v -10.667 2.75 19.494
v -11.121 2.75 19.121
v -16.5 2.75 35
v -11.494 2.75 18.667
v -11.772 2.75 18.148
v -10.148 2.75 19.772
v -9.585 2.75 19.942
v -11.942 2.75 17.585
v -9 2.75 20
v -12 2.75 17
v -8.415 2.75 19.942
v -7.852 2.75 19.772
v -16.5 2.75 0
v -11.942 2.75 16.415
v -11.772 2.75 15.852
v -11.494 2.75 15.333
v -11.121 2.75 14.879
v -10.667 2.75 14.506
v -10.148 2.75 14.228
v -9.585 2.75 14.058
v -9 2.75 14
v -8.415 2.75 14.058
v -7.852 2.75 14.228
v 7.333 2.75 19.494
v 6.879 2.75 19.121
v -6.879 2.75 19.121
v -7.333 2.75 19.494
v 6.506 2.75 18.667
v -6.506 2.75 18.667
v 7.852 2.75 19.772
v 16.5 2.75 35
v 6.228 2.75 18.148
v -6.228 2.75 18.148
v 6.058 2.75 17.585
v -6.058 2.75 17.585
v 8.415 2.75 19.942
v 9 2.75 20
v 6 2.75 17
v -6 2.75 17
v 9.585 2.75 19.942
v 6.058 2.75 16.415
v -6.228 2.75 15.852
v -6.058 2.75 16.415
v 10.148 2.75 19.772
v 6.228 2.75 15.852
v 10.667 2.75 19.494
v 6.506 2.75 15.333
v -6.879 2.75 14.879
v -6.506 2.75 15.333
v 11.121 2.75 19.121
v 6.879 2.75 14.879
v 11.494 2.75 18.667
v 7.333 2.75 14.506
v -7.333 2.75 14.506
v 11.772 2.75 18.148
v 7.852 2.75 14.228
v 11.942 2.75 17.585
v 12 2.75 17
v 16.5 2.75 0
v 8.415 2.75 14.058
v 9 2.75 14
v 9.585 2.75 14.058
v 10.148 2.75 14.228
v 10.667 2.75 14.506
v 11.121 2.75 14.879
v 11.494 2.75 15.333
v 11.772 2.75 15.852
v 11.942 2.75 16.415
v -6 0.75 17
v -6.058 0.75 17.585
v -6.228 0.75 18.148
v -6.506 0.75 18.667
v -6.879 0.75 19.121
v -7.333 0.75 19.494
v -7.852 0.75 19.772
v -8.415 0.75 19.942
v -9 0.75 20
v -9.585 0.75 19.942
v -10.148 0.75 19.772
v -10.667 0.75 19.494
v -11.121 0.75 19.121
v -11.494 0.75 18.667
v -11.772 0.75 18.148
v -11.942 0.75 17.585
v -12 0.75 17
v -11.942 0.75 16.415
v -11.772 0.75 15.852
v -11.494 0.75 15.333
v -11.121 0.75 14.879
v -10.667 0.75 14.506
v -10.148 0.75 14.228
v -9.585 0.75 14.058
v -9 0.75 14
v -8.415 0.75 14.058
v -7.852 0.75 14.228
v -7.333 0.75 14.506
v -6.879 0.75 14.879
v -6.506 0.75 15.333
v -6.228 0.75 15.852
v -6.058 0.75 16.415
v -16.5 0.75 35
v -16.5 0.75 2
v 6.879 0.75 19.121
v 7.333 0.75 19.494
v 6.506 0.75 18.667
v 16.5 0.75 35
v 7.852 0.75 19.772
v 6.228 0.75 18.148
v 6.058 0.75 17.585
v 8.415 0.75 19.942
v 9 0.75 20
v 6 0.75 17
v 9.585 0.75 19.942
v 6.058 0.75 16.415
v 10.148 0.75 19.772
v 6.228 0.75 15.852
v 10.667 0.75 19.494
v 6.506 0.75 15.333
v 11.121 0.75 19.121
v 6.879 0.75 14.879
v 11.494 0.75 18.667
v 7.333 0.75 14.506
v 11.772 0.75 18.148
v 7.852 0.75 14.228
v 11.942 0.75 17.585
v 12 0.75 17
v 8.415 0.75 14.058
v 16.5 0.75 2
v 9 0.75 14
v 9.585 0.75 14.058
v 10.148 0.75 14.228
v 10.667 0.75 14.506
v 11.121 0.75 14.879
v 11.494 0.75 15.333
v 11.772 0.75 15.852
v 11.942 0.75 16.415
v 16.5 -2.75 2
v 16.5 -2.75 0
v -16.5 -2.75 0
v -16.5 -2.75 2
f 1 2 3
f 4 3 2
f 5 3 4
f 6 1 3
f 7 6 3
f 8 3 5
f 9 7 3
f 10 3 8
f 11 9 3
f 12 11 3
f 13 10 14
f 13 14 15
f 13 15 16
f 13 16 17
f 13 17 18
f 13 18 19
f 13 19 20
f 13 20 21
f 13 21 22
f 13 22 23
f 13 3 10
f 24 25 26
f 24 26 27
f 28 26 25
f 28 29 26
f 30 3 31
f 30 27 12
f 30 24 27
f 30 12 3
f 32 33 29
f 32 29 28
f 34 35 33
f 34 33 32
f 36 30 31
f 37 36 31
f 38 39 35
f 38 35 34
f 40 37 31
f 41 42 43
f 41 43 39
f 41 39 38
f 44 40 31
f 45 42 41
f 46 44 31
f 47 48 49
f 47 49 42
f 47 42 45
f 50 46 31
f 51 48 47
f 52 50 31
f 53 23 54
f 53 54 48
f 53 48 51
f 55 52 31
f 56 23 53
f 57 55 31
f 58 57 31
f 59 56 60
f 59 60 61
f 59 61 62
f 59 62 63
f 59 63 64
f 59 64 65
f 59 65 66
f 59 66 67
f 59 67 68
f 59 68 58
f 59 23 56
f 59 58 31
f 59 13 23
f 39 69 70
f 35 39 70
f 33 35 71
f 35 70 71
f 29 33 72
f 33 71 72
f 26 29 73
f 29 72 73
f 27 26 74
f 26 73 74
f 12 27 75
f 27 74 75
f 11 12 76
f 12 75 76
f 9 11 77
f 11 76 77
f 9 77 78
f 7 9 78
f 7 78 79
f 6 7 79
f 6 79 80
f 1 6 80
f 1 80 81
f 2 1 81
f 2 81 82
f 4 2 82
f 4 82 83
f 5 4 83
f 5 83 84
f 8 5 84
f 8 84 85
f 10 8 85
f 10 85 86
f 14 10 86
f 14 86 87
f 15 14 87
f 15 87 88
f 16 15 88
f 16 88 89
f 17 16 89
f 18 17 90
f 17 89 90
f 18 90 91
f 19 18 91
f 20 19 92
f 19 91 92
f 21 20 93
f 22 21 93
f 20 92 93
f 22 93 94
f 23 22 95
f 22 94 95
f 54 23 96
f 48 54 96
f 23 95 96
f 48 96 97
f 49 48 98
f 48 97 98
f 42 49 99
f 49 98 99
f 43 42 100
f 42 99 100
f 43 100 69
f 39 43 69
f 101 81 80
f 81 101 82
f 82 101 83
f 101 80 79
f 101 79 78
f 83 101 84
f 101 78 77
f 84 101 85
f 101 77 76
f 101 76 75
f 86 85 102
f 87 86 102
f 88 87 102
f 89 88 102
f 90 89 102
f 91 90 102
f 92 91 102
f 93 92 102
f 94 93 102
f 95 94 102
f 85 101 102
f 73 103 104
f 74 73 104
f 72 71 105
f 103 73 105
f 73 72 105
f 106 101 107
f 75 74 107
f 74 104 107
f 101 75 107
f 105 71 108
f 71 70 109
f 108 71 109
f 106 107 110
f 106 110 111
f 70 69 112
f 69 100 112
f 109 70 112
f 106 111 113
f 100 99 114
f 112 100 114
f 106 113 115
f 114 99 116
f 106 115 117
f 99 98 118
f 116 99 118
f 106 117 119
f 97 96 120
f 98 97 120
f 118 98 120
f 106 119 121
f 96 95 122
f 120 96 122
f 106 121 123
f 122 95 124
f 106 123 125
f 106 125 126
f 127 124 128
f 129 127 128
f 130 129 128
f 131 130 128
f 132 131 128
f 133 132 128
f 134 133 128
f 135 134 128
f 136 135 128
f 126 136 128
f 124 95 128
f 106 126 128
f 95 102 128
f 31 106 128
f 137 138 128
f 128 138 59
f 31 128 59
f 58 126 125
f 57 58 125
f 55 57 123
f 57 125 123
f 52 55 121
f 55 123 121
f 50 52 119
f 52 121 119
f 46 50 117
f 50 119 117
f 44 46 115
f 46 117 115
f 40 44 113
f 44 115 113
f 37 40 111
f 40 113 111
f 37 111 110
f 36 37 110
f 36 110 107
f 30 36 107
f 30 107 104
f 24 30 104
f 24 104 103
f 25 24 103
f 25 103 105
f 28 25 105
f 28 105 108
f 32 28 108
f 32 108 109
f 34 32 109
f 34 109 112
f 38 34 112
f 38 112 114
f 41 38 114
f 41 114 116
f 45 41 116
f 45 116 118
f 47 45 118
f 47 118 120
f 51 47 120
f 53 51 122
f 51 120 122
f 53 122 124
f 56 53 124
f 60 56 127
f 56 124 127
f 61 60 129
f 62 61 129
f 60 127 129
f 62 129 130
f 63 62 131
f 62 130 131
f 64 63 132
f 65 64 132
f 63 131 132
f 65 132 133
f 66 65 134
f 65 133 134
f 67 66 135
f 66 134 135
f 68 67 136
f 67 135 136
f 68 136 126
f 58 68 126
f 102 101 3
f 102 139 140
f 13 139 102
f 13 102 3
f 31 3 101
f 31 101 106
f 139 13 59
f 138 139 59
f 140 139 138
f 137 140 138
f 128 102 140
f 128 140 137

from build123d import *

# Parameters (mm, degrees)
F0_W     = 33
F0_H     = 5.5
F1_DEPTH = 2
F2_W     = 33
F2_H     = 2
F3_DEPTH = 33
F4_R     = 3
F5_DEPTH = 2.001


with BuildPart() as f1:
    # F0 (on Top) → F1 (new body)
    with BuildSketch(Plane.XY):
        Rectangle(F0_W, F0_H)
    extrude(amount=F1_DEPTH)

    # F2 (on face) → F3 (join)
    with BuildSketch(Plane.XY.offset(2)):
        with Locations((0, 1.75)):
            Rectangle(F2_W, F2_H)
    extrude(amount=F3_DEPTH)

    # F4 (on face) → F5 (cut, through all)
    with BuildSketch(Plane.XZ.offset(-0.75)):
        with Locations((-9, 17)):
            Circle(F4_R)
        with Locations((9, 17)):
            Circle(F4_R)
    extrude(amount=-F5_DEPTH, mode=Mode.SUBTRACT)


solid = f1.part
